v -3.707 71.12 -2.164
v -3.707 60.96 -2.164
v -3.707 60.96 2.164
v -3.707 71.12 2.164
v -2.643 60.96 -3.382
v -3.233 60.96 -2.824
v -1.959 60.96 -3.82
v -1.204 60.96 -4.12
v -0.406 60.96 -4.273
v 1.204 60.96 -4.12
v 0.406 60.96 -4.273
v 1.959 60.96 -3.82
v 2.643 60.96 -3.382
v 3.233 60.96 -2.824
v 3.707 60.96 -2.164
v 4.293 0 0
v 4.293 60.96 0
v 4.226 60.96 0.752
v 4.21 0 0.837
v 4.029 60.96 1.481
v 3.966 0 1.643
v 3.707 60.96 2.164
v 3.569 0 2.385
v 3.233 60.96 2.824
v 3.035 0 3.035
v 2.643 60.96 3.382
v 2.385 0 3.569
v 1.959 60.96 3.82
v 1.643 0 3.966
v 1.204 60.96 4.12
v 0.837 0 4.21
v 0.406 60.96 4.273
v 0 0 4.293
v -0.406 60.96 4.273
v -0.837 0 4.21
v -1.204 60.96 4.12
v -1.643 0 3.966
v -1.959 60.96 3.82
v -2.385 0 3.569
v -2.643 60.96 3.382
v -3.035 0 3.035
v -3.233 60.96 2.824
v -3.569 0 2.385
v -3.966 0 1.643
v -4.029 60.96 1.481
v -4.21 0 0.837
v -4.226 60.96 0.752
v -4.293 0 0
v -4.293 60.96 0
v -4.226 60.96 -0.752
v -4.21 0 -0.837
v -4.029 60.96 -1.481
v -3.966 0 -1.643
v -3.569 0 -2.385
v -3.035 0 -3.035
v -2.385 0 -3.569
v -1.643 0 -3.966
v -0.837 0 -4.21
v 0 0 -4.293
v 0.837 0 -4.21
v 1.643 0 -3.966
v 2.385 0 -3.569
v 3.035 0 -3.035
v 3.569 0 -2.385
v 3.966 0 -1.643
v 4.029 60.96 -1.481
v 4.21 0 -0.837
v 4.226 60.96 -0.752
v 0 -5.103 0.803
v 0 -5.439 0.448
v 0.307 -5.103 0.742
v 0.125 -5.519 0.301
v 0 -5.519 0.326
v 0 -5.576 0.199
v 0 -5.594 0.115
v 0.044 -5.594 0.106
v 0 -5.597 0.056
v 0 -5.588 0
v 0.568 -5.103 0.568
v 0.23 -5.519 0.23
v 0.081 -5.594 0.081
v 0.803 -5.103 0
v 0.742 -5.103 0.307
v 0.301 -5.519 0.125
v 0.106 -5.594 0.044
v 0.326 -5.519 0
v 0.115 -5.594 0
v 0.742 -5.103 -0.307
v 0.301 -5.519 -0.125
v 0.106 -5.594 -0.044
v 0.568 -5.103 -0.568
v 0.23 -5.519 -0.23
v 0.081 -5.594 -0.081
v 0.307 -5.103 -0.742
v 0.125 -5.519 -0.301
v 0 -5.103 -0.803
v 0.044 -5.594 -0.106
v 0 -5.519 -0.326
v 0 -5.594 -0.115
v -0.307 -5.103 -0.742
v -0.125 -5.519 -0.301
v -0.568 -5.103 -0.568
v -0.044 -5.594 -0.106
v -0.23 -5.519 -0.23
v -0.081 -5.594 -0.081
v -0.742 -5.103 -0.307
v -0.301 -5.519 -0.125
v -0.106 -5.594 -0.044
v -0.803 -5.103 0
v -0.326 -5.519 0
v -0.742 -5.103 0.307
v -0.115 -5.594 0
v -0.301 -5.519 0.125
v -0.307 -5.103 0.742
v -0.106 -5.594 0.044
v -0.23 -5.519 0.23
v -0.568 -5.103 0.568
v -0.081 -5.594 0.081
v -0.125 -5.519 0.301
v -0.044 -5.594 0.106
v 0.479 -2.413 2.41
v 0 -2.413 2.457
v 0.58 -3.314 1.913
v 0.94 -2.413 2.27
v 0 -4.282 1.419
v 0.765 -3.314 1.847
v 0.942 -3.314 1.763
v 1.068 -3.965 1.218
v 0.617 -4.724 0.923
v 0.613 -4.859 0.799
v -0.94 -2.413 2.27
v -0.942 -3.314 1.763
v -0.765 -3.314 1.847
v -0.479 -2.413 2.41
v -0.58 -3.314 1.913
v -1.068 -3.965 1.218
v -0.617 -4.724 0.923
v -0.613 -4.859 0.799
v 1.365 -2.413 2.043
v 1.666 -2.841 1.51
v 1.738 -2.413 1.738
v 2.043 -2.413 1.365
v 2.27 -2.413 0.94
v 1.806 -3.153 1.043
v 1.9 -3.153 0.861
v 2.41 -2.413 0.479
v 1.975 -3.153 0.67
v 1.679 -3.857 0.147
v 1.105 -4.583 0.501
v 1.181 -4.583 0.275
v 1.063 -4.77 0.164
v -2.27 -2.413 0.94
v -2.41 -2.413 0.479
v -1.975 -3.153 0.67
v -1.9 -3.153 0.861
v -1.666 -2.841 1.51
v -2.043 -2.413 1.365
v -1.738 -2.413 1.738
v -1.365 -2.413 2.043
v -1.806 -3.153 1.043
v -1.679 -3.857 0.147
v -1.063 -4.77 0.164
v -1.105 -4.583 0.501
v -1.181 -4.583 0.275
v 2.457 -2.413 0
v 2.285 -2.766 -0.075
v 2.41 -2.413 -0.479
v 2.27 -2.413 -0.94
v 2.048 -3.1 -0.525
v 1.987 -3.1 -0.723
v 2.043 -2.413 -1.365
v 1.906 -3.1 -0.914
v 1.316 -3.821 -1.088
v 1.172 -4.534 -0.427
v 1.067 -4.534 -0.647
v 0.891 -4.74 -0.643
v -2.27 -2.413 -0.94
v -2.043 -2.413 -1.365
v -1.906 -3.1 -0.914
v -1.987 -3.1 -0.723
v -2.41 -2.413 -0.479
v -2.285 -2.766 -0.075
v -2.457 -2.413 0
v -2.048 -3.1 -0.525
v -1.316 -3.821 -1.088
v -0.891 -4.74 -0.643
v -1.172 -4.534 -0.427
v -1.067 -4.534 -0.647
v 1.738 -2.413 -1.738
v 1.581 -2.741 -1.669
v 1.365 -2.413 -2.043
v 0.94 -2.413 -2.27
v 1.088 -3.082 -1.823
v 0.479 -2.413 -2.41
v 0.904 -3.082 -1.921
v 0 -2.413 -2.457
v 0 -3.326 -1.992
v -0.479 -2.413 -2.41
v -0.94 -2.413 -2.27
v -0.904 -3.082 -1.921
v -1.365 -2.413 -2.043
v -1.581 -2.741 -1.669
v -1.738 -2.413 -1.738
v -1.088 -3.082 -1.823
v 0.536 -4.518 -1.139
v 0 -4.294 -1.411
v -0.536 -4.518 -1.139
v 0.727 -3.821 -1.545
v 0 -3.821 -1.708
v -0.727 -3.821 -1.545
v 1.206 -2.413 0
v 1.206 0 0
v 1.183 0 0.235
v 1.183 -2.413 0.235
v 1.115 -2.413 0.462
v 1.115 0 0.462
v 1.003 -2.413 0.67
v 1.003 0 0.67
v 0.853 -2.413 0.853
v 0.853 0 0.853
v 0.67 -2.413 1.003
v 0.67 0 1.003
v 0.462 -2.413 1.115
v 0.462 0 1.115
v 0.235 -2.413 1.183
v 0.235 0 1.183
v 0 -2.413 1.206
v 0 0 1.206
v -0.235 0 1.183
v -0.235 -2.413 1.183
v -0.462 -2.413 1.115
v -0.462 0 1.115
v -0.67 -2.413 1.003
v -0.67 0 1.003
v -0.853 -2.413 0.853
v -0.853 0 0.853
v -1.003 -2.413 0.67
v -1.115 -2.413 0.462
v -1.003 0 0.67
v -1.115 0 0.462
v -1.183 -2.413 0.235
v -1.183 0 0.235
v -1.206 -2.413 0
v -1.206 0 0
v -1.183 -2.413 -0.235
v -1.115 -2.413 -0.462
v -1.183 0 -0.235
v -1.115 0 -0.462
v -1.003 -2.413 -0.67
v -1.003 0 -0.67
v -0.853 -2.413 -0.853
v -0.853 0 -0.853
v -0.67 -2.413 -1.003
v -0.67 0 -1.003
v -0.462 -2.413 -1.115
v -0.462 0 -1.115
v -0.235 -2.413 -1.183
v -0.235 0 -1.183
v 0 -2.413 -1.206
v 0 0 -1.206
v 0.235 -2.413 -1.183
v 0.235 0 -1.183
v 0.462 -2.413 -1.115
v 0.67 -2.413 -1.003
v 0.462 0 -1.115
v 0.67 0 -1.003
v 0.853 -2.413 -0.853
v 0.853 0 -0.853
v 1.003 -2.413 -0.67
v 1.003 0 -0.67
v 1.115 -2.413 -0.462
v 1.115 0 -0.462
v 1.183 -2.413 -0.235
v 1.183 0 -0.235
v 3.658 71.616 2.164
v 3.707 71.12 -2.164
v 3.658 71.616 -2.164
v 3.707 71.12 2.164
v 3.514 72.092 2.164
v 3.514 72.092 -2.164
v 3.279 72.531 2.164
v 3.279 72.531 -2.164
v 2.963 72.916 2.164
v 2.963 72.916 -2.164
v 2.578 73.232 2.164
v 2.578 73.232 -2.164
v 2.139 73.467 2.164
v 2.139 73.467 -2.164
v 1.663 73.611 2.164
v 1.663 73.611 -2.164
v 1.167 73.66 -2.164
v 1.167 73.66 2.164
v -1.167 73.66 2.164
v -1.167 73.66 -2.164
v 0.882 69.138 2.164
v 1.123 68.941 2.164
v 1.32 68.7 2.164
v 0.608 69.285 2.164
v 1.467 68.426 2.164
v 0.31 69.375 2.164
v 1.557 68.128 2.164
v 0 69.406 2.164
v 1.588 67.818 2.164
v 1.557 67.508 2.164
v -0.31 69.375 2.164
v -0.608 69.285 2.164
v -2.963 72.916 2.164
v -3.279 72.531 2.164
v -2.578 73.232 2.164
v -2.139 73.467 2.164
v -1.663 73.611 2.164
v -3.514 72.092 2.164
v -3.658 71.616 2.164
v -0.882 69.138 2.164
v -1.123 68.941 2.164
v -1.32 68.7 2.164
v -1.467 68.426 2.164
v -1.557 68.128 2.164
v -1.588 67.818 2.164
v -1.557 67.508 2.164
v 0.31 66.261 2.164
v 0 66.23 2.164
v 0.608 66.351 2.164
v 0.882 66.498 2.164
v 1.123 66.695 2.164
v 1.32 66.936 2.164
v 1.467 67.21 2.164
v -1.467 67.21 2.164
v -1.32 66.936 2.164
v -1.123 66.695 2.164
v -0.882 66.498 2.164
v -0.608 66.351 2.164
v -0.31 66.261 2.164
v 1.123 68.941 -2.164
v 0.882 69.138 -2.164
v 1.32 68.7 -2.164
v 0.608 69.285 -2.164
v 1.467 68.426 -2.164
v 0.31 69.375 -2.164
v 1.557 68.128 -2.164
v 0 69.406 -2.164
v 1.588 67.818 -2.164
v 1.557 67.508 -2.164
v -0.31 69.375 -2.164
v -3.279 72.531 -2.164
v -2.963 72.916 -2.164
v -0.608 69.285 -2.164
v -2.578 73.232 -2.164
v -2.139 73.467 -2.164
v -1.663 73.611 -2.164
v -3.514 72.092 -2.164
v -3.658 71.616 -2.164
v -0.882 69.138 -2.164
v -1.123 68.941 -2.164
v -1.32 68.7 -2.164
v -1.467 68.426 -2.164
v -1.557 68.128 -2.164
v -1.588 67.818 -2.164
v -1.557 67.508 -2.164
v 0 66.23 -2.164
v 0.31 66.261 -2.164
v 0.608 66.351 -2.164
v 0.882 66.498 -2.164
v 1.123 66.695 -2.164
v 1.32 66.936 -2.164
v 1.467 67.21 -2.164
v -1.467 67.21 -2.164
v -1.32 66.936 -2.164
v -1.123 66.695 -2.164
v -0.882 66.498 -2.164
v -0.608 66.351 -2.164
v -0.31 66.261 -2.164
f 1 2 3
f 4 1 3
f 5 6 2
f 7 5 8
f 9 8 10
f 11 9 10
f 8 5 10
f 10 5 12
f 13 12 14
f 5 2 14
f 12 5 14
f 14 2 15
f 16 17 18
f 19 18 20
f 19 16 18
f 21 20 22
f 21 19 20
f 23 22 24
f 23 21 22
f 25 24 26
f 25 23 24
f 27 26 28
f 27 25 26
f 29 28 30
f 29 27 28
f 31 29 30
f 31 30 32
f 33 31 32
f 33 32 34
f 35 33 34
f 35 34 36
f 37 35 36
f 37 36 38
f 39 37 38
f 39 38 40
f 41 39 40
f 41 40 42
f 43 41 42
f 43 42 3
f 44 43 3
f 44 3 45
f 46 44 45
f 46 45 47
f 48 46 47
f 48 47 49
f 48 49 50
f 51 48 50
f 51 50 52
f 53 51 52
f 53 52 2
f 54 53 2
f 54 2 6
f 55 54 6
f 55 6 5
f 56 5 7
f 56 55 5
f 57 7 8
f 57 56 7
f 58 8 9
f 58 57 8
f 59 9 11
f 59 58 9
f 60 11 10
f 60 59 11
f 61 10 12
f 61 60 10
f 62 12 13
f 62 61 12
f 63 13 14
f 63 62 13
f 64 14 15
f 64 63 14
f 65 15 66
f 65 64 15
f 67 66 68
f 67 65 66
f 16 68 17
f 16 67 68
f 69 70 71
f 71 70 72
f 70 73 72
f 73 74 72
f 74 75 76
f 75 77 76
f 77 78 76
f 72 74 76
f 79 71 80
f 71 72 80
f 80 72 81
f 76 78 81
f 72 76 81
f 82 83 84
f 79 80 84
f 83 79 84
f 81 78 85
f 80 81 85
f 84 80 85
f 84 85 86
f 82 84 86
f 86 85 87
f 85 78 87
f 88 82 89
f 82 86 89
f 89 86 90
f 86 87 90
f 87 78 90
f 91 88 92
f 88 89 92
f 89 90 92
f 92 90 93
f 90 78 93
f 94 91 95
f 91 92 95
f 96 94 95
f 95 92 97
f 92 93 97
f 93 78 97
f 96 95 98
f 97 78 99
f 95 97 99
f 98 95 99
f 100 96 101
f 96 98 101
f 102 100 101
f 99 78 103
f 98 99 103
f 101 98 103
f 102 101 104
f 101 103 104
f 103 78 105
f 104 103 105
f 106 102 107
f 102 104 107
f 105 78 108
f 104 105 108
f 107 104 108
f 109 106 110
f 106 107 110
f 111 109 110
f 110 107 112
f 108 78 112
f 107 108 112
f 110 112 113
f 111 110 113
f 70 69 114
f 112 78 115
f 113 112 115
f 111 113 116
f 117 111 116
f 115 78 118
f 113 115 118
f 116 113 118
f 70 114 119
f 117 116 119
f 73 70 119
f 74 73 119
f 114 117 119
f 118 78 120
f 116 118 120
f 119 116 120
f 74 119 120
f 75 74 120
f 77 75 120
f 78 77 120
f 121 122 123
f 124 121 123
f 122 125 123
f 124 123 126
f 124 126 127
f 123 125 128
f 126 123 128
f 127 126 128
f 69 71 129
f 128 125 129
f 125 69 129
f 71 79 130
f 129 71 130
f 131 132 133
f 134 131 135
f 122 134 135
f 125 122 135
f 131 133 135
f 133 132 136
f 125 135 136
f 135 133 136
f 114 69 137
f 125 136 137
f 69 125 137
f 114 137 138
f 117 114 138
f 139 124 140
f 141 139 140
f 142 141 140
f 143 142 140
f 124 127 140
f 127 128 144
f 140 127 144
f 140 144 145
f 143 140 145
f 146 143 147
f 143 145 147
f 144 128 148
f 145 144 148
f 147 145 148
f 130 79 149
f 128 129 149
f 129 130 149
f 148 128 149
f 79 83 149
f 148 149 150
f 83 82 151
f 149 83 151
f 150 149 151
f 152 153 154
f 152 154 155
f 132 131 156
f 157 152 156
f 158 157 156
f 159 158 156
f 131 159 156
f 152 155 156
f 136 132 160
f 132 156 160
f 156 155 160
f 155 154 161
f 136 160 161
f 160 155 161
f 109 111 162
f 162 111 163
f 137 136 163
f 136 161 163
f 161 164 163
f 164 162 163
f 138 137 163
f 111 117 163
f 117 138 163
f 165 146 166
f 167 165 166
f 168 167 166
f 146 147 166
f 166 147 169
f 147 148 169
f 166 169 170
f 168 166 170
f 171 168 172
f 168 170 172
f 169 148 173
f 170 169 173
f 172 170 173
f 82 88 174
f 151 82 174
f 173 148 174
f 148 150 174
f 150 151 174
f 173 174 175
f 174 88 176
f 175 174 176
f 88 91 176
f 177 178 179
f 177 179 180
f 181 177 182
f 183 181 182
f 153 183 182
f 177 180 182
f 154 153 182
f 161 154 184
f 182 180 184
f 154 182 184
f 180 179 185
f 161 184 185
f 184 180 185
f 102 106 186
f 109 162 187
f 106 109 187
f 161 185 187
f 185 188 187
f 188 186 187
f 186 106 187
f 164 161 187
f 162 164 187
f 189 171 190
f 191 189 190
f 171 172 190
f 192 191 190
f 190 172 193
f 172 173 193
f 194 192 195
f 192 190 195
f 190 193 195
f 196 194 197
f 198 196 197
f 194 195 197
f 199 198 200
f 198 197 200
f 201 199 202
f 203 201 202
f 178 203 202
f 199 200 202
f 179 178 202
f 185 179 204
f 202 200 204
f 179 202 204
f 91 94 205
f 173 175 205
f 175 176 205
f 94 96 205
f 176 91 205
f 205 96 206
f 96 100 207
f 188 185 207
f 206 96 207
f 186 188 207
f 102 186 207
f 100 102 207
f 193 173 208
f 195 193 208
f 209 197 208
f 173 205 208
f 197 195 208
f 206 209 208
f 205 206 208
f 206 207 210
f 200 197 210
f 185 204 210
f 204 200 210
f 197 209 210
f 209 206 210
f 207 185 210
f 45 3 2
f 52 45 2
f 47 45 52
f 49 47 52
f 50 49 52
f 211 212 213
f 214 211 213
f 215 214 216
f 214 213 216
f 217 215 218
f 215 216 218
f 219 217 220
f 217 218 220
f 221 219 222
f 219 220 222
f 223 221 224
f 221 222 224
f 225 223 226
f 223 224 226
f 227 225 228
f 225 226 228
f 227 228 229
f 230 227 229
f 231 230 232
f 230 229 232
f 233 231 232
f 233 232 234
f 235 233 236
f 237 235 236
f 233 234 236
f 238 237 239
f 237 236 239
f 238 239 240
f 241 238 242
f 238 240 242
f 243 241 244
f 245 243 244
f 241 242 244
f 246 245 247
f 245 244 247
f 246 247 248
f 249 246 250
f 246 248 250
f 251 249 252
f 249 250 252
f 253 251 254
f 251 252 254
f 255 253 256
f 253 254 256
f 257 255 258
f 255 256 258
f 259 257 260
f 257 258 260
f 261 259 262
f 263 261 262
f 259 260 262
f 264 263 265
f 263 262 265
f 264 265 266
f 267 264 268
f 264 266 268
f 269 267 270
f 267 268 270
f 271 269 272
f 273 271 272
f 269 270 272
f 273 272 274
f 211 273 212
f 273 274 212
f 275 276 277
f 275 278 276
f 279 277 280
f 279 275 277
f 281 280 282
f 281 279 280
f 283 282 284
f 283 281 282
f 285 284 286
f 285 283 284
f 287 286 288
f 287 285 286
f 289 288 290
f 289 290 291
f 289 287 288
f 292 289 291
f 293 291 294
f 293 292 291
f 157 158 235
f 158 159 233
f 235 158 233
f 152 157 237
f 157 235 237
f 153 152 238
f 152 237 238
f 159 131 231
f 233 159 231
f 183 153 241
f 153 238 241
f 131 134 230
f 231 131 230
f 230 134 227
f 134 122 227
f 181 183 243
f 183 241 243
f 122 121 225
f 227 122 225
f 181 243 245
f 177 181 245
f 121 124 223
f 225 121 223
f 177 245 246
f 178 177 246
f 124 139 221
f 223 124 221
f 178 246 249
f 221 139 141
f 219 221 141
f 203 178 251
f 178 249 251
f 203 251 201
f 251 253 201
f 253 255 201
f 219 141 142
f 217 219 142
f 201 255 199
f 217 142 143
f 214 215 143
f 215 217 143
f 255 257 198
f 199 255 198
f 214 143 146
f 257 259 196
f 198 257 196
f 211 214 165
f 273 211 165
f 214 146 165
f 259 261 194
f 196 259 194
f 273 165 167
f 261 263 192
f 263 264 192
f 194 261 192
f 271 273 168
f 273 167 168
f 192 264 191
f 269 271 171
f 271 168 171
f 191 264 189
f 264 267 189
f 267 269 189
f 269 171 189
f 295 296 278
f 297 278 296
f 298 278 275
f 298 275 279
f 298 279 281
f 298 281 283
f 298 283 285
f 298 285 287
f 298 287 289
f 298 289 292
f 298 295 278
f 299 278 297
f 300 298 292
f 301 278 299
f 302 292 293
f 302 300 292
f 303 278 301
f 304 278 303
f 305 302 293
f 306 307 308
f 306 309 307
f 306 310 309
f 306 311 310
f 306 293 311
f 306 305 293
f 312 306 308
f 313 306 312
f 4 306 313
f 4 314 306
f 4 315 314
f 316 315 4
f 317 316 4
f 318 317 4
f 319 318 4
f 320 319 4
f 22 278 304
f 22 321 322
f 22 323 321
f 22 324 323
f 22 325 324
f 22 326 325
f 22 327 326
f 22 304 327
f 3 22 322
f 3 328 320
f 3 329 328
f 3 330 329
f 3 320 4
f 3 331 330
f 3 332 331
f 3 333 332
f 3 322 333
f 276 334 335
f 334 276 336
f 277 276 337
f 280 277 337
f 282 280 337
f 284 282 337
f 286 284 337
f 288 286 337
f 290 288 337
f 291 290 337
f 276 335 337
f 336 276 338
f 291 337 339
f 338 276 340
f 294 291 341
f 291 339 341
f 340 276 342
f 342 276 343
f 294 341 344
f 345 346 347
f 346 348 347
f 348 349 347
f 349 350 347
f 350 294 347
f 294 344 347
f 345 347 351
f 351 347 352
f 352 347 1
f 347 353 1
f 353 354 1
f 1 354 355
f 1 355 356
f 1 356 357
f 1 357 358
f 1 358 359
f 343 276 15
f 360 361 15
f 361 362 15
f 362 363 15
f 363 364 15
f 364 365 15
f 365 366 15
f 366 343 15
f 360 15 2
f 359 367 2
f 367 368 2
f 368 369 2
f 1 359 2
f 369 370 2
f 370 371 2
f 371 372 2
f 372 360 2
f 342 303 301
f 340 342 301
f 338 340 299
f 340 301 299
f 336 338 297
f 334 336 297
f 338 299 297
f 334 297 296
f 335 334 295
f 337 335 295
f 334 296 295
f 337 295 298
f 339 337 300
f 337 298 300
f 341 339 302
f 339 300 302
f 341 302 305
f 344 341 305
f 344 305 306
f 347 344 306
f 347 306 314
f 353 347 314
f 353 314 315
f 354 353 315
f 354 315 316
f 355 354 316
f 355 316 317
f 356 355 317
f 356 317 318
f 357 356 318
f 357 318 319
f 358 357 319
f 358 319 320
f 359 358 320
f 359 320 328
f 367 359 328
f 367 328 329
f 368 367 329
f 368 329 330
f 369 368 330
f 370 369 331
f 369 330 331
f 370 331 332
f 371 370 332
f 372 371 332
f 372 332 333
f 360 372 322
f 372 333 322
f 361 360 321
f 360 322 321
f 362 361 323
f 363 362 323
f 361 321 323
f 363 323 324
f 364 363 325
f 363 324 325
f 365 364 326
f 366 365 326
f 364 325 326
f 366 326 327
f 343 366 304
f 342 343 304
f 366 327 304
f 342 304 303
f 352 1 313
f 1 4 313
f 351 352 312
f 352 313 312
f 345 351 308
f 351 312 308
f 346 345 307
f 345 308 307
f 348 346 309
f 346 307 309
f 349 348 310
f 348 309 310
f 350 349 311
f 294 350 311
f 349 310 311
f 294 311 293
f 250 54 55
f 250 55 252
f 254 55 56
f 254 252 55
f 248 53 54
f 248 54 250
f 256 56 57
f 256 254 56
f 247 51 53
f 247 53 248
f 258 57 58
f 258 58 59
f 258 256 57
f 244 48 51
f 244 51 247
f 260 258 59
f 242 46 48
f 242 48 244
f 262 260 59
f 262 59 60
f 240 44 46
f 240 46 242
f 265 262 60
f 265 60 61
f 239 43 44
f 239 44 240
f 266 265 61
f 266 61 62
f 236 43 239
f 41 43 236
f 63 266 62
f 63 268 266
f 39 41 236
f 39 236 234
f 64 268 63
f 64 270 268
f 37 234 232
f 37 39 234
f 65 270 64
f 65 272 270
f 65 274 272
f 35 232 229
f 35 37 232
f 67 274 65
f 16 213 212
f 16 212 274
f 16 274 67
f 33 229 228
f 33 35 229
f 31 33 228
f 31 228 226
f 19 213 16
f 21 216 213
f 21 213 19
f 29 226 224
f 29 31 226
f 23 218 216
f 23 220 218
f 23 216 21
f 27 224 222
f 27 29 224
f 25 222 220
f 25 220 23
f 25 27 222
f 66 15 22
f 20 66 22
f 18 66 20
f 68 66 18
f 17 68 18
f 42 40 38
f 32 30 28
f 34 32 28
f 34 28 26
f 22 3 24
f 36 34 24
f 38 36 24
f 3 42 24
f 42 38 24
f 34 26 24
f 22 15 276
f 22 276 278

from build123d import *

# Parameters (mm, degrees)
F0_R      = 4.2926
F1_DEPTH  = 60.96
F2_R      = 1.2065
F3_DEPTH  = 2.413
F6_W      = 7.414472
F6_H      = 4.327964
F7_DEPTH  = 12.7
F8_R      = 2.54
F9_R      = 1.5875
F10_DEPTH = 6.457582


with BuildPart() as f1:
    # F0 (on Front) → F1 (new body)
    with BuildSketch(Plane.XZ):
        Circle(F0_R)
    extrude(amount=-F1_DEPTH)

    # F2 (on Front) → F3 (join)
    with BuildSketch(Plane.XZ):
        Circle(F2_R)
    extrude(amount=F3_DEPTH)

    # F4 (on Right) → F5 (revolve)
    with BuildSketch(Plane.YZ):
        with BuildLine():
            Line((-5.588, 0), (-2.413, 0))
            Line((-2.413, 0), (-2.413, 2.45745))
            add(Edge.make_bspline(
                [(-2.413, 2.45745), (-3.605465, 1.903019), (-5.753043, 0.65037), (-5.588, 0)],
                knots=[0, 0, 0, 0, 4.014933, 4.014933, 4.014933, 4.014933], degree=3))
        make_face()
    revolve(axis=Axis((0, -4.0005, 0), (0, 1, 0)))

    # F6 (on face) → F7 (join)
    with BuildSketch(Plane(origin=(0, 60.96, 0), x_dir=(-1, 0, 0), z_dir=(0, 1, 0))):
        Rectangle(F6_W, F6_H)
    extrude(amount=F7_DEPTH)

    # F8
    f8_edges = [f1.edges().sort_by_distance(p)[0] for p in [
        (-3.707236, 73.66, 0),
        (3.707236, 73.66, 0),
    ]]
    fillet(f8_edges, radius=F8_R)

    # F9 (on face) → F10 (cut, through all)
    with BuildSketch(Plane.XY.offset(2.163982)):
        with Locations((0, 67.818)):
            Circle(F9_R)
    extrude(amount=-F10_DEPTH, mode=Mode.SUBTRACT)


solid = f1.part
